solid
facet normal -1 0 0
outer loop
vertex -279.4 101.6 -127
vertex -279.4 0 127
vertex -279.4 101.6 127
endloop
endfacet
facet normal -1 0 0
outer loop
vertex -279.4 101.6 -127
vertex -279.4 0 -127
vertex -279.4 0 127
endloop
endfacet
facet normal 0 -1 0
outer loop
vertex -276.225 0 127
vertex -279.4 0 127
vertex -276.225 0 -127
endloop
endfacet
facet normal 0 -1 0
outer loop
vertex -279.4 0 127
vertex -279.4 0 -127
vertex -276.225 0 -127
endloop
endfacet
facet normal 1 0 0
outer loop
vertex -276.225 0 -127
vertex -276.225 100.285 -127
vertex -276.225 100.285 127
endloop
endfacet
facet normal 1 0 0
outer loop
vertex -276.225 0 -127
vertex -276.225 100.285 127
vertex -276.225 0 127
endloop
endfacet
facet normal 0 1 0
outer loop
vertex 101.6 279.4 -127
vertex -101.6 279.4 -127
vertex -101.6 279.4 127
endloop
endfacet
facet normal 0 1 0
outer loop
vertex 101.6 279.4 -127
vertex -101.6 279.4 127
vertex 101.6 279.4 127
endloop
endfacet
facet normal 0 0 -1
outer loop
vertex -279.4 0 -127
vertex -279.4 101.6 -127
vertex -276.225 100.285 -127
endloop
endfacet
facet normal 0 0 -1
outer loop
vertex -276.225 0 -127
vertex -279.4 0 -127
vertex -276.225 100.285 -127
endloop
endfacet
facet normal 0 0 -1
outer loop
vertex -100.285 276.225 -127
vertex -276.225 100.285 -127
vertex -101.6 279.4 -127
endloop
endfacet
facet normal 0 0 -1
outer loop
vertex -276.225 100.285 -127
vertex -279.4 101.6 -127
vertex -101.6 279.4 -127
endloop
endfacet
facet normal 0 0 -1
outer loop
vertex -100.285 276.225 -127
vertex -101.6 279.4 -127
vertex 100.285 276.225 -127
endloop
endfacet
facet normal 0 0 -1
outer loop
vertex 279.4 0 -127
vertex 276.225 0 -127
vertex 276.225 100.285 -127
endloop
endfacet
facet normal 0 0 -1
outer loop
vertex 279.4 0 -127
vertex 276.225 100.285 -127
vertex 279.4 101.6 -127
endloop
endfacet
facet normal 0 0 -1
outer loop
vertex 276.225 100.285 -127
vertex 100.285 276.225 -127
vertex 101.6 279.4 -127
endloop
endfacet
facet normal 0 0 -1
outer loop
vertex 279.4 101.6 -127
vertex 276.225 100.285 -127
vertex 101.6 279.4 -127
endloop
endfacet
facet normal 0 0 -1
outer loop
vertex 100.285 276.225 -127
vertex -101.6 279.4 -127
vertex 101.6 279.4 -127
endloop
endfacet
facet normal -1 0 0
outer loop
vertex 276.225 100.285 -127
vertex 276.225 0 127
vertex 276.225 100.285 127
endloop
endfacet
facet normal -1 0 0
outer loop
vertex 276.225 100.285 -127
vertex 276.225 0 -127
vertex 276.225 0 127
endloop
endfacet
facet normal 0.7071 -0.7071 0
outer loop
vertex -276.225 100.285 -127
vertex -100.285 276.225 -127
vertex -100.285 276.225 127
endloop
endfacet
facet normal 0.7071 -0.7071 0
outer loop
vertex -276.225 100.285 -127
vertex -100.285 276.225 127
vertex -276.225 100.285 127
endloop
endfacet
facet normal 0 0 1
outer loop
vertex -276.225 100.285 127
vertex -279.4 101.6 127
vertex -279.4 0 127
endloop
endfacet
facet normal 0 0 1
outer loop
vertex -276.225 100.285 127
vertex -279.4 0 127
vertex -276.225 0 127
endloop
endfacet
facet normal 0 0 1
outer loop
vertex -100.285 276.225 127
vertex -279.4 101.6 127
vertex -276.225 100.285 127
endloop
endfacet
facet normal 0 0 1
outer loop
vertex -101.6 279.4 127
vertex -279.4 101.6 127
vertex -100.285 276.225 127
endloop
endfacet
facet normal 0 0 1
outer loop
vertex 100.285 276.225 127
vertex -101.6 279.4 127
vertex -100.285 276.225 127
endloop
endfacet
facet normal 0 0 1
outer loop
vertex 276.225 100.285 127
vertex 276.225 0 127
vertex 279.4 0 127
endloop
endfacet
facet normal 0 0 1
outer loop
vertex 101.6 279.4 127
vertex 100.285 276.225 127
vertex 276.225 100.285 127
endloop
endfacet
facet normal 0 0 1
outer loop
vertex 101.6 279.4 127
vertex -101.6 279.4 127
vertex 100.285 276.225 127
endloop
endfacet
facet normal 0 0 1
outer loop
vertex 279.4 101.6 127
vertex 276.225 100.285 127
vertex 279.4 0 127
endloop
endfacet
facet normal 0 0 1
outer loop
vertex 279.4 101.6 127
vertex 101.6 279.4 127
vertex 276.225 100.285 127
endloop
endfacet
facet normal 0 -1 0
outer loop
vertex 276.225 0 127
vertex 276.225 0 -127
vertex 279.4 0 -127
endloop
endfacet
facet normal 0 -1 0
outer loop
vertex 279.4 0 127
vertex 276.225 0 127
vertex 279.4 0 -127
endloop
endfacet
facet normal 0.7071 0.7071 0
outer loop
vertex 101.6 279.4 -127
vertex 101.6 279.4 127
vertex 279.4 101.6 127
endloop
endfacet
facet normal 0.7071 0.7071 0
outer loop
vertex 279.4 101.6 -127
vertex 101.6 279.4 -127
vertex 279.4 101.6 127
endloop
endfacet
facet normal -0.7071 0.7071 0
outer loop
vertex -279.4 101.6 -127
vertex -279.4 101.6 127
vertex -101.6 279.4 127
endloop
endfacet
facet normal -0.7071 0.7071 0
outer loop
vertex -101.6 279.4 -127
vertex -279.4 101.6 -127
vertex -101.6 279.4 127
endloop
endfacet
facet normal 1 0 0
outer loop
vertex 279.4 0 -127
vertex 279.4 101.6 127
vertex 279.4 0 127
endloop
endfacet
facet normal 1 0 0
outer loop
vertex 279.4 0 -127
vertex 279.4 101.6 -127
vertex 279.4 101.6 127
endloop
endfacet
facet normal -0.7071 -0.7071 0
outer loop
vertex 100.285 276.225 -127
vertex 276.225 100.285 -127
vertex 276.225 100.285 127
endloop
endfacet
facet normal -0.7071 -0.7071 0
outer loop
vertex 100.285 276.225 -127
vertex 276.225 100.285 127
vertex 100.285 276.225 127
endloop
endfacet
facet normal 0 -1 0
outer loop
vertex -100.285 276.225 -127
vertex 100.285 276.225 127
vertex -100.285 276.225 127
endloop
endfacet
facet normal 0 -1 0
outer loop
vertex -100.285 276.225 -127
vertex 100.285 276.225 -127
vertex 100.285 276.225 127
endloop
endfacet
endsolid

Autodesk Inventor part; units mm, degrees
ref_plane "YZ Plane" through (0, 0, 0) normal (1, 0, 0) x (0, 1, 0)
ref_plane "XZ Plane" through (0, 0, 0) normal (0, 1, 0) x (-1, 0, 0)
ref_plane "XY Plane" through (0, 0, 0) normal (0, 0, 1) x (1, 0, 0)
sketch "Sketch1" plane through (0, 0, 0) normal (0, 0, 1) x (1, 0, 0)
  line L0 (-391.16, 0) -> (391.16, 0) projected
  line L1 (0, -55.88) -> (0, 335.28) projected
  line L2 (-101.6, 279.4) -> (101.6, 279.4)
  line L3 (101.6, 279.4) -> (279.4, 101.6)
  line L4 (279.4, 101.6) -> (279.4, 0)
  line L5 (279.4, 0) -> (-279.4, 0) construction
  line L6 (-279.4, 0) -> (-279.4, 101.6)
  line L7 (-279.4, 101.6) -> (-101.6, 279.4)
  line L8 (-279.4, 101.6) -> (279.4, 101.6) construction
  line L9 (276.225, 100.2849) -> (100.2849, 276.225)
  line L10 (100.2849, 276.225) -> (-100.2849, 276.225)
  line L11 (-100.2849, 276.225) -> (-276.225, 100.2849)
  line L12 (-276.225, 100.2849) -> (-276.225, 0)
  line L13 (276.225, 0) -> (276.225, 100.2849)
  line L14 (-279.4, 0) -> (-276.225, 0)
  line L15 (276.225, 0) -> (279.4, 0)
  point P0 (0, 0)
  point P1 (-279.4, 50.8)
  point P2 (0, 0)
  point P3 (0, 279.4)
  dimension "d0" = 558.8
  dimension "d1" = 101.6
  dimension "d2" = 45
  dimension "d3" = 203.2
  dimension "d4" = 3.175
  dimension "d5" = 3.175
  dimension "d6" = 3.175
  dimension "d7" = 3.175
extrude "Extrusion1" add sketch "Sketch1" along normal mid plane 254 contours L6 L7 L2 L1 L10 L11 L12 L0 | L13 L9 L10 L1 L2 L3 L4 L0
equation "\"d5\" = d4"
equation "\"d6\" = d4"
equation "\"d7\" = d4"
properties part number "middle shell"
